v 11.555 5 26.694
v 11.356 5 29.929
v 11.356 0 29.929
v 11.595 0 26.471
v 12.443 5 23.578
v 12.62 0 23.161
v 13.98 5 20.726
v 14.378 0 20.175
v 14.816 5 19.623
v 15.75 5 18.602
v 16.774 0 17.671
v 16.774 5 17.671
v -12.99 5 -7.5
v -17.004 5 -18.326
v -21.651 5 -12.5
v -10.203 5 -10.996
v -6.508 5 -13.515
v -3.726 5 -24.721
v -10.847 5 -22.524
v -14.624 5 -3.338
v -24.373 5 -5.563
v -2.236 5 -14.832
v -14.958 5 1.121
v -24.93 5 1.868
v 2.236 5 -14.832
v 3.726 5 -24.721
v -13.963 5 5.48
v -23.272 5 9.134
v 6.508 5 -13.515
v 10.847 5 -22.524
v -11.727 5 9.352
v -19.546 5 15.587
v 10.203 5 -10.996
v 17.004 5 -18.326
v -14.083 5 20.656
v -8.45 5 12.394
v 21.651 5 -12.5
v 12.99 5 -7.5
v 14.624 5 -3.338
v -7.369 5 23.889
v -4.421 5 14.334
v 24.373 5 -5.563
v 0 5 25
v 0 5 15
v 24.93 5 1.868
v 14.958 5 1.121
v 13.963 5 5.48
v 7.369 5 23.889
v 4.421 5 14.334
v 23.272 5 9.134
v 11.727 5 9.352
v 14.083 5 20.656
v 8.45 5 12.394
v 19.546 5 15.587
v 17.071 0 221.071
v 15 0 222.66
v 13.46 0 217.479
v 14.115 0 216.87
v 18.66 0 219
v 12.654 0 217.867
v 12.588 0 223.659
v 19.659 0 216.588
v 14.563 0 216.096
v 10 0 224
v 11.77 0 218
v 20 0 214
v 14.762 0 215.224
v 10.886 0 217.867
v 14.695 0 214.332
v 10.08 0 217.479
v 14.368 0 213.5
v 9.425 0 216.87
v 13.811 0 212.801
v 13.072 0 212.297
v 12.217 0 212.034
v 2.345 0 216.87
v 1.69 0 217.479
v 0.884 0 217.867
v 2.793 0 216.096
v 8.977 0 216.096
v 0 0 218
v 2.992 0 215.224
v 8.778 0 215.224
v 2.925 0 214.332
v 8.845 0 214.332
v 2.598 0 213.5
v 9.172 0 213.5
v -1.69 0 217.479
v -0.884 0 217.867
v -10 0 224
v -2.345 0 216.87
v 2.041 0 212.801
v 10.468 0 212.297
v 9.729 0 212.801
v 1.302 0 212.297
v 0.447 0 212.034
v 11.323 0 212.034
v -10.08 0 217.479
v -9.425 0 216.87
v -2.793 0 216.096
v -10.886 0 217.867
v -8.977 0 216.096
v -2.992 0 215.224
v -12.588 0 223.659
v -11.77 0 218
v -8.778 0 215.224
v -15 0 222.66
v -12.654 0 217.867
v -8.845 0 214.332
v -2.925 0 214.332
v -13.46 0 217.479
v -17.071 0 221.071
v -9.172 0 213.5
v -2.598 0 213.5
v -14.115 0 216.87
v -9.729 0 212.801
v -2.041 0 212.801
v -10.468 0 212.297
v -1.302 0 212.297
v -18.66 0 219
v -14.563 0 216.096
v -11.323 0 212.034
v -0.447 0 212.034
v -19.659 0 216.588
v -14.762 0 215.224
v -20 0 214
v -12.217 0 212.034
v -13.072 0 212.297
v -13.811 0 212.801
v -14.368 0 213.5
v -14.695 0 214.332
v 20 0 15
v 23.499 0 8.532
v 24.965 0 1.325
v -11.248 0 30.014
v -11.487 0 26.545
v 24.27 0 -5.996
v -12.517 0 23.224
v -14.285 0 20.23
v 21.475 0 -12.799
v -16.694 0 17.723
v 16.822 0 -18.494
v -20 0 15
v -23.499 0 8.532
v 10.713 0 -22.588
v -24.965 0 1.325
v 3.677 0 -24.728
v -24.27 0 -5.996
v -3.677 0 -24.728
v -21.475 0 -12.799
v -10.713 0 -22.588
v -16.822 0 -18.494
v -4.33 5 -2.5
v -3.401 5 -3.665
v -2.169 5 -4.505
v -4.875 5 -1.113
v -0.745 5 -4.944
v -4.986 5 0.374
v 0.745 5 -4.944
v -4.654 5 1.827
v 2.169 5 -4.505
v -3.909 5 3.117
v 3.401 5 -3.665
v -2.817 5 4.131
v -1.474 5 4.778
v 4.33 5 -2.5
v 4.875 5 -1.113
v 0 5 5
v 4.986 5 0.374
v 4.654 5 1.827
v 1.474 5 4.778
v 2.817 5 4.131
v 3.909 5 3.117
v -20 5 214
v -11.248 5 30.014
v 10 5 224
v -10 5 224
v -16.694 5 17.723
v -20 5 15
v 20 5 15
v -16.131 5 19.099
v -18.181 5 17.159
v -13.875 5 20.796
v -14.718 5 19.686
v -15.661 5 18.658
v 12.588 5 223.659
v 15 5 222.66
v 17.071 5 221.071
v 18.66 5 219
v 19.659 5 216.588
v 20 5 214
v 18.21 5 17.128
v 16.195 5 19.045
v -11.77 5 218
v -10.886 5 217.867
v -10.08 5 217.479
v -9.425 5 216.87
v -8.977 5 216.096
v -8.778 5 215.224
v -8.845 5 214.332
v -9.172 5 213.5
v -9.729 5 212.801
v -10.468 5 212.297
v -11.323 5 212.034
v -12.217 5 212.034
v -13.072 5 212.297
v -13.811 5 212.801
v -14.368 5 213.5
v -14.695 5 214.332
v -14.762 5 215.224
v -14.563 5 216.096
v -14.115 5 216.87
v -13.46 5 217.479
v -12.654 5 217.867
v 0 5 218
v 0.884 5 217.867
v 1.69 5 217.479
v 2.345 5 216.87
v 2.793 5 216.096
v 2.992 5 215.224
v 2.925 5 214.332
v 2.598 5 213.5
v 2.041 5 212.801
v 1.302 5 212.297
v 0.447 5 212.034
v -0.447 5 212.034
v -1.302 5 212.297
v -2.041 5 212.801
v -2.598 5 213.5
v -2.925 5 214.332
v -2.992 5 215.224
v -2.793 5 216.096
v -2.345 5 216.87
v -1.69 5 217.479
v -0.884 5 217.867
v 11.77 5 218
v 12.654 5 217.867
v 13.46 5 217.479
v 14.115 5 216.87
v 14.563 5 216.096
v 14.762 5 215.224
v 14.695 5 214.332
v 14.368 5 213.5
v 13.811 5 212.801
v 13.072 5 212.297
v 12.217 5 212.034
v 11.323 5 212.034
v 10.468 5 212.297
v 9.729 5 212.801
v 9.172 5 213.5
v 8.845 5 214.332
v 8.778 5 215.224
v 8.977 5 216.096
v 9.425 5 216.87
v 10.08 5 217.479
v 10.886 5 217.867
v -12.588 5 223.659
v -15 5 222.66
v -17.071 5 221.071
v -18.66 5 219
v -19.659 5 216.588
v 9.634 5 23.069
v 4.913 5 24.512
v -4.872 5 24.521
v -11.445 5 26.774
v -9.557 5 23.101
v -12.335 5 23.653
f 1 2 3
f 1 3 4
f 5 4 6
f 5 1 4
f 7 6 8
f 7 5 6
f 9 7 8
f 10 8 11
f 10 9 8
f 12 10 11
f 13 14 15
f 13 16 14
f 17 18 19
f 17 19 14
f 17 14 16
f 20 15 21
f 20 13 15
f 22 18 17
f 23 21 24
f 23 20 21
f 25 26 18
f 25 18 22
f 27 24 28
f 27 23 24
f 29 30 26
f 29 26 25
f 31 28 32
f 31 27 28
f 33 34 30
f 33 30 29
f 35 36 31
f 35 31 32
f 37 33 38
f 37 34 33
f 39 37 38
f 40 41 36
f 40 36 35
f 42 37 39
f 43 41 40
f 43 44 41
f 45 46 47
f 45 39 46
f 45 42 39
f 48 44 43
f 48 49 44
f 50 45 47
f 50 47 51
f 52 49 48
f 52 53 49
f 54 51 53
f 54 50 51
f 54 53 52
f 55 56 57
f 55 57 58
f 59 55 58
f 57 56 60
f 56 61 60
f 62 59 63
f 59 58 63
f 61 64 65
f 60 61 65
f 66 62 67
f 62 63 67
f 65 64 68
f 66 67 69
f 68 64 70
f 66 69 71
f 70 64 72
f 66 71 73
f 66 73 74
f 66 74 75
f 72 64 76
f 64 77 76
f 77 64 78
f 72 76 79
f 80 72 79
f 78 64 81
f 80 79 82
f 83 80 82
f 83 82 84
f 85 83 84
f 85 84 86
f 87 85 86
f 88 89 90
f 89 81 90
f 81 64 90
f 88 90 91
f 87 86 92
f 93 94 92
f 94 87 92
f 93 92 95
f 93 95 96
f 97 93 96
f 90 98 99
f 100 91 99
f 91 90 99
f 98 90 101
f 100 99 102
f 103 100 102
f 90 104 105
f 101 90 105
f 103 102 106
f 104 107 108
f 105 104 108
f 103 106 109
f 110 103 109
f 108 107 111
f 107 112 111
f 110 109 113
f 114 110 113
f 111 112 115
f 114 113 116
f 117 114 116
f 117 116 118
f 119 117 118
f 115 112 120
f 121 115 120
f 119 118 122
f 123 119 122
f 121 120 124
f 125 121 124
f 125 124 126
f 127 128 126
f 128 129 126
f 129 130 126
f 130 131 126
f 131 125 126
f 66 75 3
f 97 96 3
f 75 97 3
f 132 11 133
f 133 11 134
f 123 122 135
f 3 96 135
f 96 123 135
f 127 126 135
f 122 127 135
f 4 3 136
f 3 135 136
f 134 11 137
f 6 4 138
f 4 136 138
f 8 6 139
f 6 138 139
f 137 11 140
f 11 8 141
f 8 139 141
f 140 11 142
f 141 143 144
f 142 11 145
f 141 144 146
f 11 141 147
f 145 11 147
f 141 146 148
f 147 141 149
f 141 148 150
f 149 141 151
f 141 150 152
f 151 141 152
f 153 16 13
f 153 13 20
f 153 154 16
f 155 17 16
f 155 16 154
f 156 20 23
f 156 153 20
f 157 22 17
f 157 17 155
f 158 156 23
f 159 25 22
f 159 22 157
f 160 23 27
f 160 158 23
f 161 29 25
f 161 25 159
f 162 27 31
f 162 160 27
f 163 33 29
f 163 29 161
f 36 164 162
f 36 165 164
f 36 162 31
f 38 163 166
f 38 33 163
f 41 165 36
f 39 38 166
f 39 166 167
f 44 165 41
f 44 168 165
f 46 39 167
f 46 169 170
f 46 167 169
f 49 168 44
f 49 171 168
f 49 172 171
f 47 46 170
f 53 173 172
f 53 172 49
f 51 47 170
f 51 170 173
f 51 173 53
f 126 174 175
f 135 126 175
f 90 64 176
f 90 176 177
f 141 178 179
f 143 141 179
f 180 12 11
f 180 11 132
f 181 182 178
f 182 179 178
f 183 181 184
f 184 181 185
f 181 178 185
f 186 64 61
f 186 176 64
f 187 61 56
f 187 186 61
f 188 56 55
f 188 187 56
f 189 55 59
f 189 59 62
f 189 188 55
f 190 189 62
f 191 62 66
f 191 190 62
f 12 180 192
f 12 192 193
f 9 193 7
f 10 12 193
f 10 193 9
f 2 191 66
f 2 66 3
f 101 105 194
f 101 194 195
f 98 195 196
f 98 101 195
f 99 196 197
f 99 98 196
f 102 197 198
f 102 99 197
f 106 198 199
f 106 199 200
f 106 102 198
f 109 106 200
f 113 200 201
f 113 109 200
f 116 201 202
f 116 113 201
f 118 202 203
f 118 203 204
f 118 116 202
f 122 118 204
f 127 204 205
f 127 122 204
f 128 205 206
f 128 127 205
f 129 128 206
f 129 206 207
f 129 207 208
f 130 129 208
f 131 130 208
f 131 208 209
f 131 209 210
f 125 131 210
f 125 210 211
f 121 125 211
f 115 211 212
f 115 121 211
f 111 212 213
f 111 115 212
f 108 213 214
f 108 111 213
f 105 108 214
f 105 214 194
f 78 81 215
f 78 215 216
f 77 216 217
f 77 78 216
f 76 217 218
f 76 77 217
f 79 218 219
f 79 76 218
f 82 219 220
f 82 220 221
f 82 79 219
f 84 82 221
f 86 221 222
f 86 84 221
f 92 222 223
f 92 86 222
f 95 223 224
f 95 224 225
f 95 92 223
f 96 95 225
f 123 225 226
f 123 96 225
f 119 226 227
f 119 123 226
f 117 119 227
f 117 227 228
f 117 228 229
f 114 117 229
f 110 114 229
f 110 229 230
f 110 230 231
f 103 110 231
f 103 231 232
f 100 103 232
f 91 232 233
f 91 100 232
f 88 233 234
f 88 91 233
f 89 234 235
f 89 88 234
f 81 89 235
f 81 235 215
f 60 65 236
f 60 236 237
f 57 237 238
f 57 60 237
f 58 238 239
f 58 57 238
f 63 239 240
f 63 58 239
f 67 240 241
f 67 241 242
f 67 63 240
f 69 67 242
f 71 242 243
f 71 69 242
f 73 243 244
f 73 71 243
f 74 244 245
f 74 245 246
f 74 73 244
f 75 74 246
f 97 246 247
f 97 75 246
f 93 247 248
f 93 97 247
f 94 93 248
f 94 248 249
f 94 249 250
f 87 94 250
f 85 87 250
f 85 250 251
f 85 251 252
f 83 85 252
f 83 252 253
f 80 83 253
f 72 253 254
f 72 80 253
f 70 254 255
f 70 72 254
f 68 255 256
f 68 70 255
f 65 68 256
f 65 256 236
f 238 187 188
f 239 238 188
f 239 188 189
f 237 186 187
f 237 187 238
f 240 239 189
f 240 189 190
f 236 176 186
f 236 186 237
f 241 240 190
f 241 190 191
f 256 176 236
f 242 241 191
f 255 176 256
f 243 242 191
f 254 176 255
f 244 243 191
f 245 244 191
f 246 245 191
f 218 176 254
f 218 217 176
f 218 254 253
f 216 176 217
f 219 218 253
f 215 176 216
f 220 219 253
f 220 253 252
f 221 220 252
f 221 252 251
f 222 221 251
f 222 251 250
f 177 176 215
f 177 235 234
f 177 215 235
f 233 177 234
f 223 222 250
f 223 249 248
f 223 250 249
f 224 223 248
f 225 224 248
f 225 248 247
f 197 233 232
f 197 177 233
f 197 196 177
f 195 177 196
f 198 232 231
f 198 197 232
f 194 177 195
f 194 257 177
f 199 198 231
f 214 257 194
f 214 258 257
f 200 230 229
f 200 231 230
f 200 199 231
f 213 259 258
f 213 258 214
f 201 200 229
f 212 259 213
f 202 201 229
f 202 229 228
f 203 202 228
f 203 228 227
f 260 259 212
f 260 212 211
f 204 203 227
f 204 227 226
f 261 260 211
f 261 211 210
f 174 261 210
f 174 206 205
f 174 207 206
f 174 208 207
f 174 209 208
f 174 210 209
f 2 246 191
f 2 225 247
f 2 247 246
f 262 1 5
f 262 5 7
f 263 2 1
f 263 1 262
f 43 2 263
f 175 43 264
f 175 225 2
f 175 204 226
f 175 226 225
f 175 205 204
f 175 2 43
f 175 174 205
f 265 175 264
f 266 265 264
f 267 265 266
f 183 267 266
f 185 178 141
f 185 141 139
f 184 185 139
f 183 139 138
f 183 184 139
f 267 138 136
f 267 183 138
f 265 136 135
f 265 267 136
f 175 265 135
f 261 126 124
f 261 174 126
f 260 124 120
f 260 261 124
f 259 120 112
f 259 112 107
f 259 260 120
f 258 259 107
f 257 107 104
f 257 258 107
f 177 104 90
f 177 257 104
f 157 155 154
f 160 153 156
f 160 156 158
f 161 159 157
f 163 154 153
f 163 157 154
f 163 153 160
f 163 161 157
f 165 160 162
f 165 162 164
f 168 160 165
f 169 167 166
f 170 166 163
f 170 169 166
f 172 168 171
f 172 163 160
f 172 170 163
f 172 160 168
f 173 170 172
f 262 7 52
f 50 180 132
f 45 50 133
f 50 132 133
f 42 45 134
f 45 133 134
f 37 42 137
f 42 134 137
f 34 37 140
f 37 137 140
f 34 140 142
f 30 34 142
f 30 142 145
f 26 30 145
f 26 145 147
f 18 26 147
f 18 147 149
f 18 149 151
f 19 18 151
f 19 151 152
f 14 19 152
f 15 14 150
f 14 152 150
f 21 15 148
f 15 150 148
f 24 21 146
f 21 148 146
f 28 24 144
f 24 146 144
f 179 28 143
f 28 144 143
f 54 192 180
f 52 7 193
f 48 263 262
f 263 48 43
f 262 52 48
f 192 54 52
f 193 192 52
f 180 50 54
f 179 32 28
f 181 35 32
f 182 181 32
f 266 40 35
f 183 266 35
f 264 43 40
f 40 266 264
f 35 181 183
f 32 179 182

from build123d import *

# Parameters (mm, degrees)
SKETCH2_R           = 25
BOSS_EXTRUDE2_DEPTH = 5
SKETCH3_R           = 15
BOSS_EXTRUDE3_DEPTH = 0.0001
SKETCH4_R           = 5
BOSS_EXTRUDE4_DEPTH = 0.0001
SKETCH20_R          = 3
BOSS_EXTRUDE8_DEPTH = 4.9999
FILLET6_R           = 10
CUT_EXTRUDE4_DEPTH  = 4.9999
FILLET8_R           = 15


with BuildPart() as part:
    # Sketch2 → Boss-Extrude2 (new body)
    with BuildSketch(Plane(origin=(0, 0, 0), x_dir=(1, 0, 0), z_dir=(0, 1, 0))):
        with Locations(Location((0, 0, 0), (0, 0, 270))):
            Circle(SKETCH2_R)
    extrude(amount=BOSS_EXTRUDE2_DEPTH)

    # Sketch3 → Boss-Extrude3 (add)
    with BuildSketch(Plane(origin=(0, 5, 0), x_dir=(1, 0, 0), z_dir=(0, 1, 0))):
        with Locations(Location((0, 0, 0), (0, 0, 270))):
            Circle(SKETCH3_R)
    extrude(amount=BOSS_EXTRUDE3_DEPTH)

    # Sketch4 → Boss-Extrude4 (add)
    with BuildSketch(Plane(origin=(0, 5.0001, 0), x_dir=(1, 0, 0), z_dir=(0, 1, 0))):
        with Locations(Location((0, 0, 0), (0, 0, 270))):
            Circle(SKETCH4_R)
    extrude(amount=BOSS_EXTRUDE4_DEPTH)

    # Sketch20 → Boss-Extrude8 (add)
    with BuildSketch(Plane(origin=(0, 0, 0), x_dir=(1, 0, 0), z_dir=(0, 1, 0))):
        Polygon((20, 0), (20, -224), (-20, -224), (-20, 0), (0, 0), align=None)
        with Locations(Location((-11.77, -215, 0), (0, 0, 270))):
            Circle(SKETCH20_R, mode=Mode.SUBTRACT)
        with Locations(Location((11.77, -215, 0), (0, 0, 270))):
            Circle(SKETCH20_R, mode=Mode.SUBTRACT)
        with Locations(Location((0, -215, 0), (0, 0, 270))):
            Circle(SKETCH20_R, mode=Mode.SUBTRACT)
    extrude(amount=BOSS_EXTRUDE8_DEPTH)

    # Fillet6
    fillet6_edges = [part.edges().sort_by_distance(p)[0] for p in [
        (20, 2.49995, 224),
        (-20, 2.49995, 224),
    ]]
    fillet(fillet6_edges, radius=FILLET6_R)

    # Sketch21 → Cut-Extrude4 (cut)
    with BuildSketch(Plane(origin=(0, 4.9999, 0), x_dir=(1, 0, 0), z_dir=(0, 1, 0))):
        Polygon((20, -214), (11.00508109, -22.44745398), (20, -15), align=None)
        Polygon((-20, -214), (-10.890807236, -22.503117956), (-20, -15), align=None)
    extrude(amount=-CUT_EXTRUDE4_DEPTH, mode=Mode.SUBTRACT)

    # Fillet8
    # the kernel refuses this fillet: 15 mm, written as the material it adds along each edge
    with BuildSketch(Plane(origin=(11.00508109, 4.9999, 22.44745398), x_dir=(0.7702520044264655, 0, -0.6377396409797748), z_dir=(0, -1, 0))) as fillet8_piece_1:
        with BuildLine():
            CenterArc((FILLET8_R * 0.499290509881, FILLET8_R), FILLET8_R, 216.934957366, 53.065042634)
            Line((-FILLET8_R * 0.300027670723, FILLET8_R * 0.399091981951), (0, 0))
            Line((0, 0), (FILLET8_R * 0.499290509881, 0))
        make_face()
    extrude(amount=4.9999)
    with BuildSketch(Plane(origin=(-10.890807236, 4.9999, 22.503117956), x_dir=(-0.04751463426257685, 0, 0.9988705419276782), z_dir=(0, -1, 0))) as fillet8_piece_2:
        with BuildLine():
            CenterArc((FILLET8_R * 0.501260466094, FILLET8_R), FILLET8_R, 216.754404895, 53.245595105)
            Line((-FILLET8_R * 0.299947345081, FILLET8_R * 0.401613800867), (0, 0))
            Line((0, 0), (FILLET8_R * 0.501260466094, 0))
        make_face()
    extrude(amount=4.9999)


solid = part.part
